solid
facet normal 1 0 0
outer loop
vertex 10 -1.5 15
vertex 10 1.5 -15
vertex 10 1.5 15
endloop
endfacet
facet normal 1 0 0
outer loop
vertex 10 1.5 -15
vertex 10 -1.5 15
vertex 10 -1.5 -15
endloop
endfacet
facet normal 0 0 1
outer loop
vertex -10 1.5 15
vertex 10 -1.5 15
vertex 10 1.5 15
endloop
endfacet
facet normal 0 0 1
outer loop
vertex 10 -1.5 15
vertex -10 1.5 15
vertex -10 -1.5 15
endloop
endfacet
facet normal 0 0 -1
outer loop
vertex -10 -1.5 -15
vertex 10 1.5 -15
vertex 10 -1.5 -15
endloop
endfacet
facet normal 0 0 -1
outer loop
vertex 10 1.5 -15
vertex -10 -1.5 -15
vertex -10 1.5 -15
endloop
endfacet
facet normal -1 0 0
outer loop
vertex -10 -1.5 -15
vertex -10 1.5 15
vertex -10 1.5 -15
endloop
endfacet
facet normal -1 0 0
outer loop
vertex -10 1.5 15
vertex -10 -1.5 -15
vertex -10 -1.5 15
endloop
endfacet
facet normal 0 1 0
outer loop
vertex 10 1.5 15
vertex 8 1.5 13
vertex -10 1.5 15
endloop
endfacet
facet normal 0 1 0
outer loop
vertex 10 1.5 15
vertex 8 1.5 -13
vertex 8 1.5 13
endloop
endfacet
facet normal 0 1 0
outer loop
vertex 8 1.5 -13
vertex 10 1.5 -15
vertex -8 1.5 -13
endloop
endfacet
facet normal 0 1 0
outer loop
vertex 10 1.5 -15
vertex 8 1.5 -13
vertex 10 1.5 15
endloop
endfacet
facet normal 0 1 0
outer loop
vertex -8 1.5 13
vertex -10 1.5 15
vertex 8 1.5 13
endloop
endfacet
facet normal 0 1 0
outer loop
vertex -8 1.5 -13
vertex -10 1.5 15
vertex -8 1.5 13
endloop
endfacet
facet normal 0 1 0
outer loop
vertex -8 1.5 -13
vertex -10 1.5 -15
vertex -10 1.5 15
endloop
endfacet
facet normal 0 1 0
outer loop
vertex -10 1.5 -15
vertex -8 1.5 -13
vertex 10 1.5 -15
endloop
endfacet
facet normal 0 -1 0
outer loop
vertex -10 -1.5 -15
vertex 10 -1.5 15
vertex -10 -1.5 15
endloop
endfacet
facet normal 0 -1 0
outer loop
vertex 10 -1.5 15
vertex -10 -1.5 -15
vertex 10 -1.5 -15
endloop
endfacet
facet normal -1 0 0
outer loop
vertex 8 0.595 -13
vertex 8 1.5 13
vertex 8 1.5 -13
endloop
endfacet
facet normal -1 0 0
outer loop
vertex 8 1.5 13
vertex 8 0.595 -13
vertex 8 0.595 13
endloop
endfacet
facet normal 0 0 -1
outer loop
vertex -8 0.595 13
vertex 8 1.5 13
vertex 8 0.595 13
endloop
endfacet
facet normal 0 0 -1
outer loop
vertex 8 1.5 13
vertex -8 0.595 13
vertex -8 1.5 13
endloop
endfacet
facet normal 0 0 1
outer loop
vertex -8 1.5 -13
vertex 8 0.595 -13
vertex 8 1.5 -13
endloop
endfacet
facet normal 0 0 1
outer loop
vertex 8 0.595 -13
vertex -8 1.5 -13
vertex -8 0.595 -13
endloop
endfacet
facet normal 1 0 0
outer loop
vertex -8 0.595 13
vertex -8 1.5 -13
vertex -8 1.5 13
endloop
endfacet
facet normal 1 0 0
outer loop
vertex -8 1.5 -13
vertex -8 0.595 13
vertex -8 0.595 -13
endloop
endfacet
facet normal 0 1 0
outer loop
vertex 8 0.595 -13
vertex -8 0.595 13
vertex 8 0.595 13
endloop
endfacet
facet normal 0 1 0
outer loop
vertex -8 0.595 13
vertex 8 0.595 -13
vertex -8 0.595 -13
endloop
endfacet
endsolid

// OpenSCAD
module painting(height, width, thickness, frameRatioThickness, frameWidth) {
    difference() {
        cube([width, thickness, height], center=true);
        translate([0, -(-thickness+frameRatioThickness*thickness)/2,0]) cube([width-frameWidth*2, frameRatioThickness*thickness+0.01, height-frameWidth*2], center=true);
    }
}
painting(30, 20, 3, 0.3, 2);
